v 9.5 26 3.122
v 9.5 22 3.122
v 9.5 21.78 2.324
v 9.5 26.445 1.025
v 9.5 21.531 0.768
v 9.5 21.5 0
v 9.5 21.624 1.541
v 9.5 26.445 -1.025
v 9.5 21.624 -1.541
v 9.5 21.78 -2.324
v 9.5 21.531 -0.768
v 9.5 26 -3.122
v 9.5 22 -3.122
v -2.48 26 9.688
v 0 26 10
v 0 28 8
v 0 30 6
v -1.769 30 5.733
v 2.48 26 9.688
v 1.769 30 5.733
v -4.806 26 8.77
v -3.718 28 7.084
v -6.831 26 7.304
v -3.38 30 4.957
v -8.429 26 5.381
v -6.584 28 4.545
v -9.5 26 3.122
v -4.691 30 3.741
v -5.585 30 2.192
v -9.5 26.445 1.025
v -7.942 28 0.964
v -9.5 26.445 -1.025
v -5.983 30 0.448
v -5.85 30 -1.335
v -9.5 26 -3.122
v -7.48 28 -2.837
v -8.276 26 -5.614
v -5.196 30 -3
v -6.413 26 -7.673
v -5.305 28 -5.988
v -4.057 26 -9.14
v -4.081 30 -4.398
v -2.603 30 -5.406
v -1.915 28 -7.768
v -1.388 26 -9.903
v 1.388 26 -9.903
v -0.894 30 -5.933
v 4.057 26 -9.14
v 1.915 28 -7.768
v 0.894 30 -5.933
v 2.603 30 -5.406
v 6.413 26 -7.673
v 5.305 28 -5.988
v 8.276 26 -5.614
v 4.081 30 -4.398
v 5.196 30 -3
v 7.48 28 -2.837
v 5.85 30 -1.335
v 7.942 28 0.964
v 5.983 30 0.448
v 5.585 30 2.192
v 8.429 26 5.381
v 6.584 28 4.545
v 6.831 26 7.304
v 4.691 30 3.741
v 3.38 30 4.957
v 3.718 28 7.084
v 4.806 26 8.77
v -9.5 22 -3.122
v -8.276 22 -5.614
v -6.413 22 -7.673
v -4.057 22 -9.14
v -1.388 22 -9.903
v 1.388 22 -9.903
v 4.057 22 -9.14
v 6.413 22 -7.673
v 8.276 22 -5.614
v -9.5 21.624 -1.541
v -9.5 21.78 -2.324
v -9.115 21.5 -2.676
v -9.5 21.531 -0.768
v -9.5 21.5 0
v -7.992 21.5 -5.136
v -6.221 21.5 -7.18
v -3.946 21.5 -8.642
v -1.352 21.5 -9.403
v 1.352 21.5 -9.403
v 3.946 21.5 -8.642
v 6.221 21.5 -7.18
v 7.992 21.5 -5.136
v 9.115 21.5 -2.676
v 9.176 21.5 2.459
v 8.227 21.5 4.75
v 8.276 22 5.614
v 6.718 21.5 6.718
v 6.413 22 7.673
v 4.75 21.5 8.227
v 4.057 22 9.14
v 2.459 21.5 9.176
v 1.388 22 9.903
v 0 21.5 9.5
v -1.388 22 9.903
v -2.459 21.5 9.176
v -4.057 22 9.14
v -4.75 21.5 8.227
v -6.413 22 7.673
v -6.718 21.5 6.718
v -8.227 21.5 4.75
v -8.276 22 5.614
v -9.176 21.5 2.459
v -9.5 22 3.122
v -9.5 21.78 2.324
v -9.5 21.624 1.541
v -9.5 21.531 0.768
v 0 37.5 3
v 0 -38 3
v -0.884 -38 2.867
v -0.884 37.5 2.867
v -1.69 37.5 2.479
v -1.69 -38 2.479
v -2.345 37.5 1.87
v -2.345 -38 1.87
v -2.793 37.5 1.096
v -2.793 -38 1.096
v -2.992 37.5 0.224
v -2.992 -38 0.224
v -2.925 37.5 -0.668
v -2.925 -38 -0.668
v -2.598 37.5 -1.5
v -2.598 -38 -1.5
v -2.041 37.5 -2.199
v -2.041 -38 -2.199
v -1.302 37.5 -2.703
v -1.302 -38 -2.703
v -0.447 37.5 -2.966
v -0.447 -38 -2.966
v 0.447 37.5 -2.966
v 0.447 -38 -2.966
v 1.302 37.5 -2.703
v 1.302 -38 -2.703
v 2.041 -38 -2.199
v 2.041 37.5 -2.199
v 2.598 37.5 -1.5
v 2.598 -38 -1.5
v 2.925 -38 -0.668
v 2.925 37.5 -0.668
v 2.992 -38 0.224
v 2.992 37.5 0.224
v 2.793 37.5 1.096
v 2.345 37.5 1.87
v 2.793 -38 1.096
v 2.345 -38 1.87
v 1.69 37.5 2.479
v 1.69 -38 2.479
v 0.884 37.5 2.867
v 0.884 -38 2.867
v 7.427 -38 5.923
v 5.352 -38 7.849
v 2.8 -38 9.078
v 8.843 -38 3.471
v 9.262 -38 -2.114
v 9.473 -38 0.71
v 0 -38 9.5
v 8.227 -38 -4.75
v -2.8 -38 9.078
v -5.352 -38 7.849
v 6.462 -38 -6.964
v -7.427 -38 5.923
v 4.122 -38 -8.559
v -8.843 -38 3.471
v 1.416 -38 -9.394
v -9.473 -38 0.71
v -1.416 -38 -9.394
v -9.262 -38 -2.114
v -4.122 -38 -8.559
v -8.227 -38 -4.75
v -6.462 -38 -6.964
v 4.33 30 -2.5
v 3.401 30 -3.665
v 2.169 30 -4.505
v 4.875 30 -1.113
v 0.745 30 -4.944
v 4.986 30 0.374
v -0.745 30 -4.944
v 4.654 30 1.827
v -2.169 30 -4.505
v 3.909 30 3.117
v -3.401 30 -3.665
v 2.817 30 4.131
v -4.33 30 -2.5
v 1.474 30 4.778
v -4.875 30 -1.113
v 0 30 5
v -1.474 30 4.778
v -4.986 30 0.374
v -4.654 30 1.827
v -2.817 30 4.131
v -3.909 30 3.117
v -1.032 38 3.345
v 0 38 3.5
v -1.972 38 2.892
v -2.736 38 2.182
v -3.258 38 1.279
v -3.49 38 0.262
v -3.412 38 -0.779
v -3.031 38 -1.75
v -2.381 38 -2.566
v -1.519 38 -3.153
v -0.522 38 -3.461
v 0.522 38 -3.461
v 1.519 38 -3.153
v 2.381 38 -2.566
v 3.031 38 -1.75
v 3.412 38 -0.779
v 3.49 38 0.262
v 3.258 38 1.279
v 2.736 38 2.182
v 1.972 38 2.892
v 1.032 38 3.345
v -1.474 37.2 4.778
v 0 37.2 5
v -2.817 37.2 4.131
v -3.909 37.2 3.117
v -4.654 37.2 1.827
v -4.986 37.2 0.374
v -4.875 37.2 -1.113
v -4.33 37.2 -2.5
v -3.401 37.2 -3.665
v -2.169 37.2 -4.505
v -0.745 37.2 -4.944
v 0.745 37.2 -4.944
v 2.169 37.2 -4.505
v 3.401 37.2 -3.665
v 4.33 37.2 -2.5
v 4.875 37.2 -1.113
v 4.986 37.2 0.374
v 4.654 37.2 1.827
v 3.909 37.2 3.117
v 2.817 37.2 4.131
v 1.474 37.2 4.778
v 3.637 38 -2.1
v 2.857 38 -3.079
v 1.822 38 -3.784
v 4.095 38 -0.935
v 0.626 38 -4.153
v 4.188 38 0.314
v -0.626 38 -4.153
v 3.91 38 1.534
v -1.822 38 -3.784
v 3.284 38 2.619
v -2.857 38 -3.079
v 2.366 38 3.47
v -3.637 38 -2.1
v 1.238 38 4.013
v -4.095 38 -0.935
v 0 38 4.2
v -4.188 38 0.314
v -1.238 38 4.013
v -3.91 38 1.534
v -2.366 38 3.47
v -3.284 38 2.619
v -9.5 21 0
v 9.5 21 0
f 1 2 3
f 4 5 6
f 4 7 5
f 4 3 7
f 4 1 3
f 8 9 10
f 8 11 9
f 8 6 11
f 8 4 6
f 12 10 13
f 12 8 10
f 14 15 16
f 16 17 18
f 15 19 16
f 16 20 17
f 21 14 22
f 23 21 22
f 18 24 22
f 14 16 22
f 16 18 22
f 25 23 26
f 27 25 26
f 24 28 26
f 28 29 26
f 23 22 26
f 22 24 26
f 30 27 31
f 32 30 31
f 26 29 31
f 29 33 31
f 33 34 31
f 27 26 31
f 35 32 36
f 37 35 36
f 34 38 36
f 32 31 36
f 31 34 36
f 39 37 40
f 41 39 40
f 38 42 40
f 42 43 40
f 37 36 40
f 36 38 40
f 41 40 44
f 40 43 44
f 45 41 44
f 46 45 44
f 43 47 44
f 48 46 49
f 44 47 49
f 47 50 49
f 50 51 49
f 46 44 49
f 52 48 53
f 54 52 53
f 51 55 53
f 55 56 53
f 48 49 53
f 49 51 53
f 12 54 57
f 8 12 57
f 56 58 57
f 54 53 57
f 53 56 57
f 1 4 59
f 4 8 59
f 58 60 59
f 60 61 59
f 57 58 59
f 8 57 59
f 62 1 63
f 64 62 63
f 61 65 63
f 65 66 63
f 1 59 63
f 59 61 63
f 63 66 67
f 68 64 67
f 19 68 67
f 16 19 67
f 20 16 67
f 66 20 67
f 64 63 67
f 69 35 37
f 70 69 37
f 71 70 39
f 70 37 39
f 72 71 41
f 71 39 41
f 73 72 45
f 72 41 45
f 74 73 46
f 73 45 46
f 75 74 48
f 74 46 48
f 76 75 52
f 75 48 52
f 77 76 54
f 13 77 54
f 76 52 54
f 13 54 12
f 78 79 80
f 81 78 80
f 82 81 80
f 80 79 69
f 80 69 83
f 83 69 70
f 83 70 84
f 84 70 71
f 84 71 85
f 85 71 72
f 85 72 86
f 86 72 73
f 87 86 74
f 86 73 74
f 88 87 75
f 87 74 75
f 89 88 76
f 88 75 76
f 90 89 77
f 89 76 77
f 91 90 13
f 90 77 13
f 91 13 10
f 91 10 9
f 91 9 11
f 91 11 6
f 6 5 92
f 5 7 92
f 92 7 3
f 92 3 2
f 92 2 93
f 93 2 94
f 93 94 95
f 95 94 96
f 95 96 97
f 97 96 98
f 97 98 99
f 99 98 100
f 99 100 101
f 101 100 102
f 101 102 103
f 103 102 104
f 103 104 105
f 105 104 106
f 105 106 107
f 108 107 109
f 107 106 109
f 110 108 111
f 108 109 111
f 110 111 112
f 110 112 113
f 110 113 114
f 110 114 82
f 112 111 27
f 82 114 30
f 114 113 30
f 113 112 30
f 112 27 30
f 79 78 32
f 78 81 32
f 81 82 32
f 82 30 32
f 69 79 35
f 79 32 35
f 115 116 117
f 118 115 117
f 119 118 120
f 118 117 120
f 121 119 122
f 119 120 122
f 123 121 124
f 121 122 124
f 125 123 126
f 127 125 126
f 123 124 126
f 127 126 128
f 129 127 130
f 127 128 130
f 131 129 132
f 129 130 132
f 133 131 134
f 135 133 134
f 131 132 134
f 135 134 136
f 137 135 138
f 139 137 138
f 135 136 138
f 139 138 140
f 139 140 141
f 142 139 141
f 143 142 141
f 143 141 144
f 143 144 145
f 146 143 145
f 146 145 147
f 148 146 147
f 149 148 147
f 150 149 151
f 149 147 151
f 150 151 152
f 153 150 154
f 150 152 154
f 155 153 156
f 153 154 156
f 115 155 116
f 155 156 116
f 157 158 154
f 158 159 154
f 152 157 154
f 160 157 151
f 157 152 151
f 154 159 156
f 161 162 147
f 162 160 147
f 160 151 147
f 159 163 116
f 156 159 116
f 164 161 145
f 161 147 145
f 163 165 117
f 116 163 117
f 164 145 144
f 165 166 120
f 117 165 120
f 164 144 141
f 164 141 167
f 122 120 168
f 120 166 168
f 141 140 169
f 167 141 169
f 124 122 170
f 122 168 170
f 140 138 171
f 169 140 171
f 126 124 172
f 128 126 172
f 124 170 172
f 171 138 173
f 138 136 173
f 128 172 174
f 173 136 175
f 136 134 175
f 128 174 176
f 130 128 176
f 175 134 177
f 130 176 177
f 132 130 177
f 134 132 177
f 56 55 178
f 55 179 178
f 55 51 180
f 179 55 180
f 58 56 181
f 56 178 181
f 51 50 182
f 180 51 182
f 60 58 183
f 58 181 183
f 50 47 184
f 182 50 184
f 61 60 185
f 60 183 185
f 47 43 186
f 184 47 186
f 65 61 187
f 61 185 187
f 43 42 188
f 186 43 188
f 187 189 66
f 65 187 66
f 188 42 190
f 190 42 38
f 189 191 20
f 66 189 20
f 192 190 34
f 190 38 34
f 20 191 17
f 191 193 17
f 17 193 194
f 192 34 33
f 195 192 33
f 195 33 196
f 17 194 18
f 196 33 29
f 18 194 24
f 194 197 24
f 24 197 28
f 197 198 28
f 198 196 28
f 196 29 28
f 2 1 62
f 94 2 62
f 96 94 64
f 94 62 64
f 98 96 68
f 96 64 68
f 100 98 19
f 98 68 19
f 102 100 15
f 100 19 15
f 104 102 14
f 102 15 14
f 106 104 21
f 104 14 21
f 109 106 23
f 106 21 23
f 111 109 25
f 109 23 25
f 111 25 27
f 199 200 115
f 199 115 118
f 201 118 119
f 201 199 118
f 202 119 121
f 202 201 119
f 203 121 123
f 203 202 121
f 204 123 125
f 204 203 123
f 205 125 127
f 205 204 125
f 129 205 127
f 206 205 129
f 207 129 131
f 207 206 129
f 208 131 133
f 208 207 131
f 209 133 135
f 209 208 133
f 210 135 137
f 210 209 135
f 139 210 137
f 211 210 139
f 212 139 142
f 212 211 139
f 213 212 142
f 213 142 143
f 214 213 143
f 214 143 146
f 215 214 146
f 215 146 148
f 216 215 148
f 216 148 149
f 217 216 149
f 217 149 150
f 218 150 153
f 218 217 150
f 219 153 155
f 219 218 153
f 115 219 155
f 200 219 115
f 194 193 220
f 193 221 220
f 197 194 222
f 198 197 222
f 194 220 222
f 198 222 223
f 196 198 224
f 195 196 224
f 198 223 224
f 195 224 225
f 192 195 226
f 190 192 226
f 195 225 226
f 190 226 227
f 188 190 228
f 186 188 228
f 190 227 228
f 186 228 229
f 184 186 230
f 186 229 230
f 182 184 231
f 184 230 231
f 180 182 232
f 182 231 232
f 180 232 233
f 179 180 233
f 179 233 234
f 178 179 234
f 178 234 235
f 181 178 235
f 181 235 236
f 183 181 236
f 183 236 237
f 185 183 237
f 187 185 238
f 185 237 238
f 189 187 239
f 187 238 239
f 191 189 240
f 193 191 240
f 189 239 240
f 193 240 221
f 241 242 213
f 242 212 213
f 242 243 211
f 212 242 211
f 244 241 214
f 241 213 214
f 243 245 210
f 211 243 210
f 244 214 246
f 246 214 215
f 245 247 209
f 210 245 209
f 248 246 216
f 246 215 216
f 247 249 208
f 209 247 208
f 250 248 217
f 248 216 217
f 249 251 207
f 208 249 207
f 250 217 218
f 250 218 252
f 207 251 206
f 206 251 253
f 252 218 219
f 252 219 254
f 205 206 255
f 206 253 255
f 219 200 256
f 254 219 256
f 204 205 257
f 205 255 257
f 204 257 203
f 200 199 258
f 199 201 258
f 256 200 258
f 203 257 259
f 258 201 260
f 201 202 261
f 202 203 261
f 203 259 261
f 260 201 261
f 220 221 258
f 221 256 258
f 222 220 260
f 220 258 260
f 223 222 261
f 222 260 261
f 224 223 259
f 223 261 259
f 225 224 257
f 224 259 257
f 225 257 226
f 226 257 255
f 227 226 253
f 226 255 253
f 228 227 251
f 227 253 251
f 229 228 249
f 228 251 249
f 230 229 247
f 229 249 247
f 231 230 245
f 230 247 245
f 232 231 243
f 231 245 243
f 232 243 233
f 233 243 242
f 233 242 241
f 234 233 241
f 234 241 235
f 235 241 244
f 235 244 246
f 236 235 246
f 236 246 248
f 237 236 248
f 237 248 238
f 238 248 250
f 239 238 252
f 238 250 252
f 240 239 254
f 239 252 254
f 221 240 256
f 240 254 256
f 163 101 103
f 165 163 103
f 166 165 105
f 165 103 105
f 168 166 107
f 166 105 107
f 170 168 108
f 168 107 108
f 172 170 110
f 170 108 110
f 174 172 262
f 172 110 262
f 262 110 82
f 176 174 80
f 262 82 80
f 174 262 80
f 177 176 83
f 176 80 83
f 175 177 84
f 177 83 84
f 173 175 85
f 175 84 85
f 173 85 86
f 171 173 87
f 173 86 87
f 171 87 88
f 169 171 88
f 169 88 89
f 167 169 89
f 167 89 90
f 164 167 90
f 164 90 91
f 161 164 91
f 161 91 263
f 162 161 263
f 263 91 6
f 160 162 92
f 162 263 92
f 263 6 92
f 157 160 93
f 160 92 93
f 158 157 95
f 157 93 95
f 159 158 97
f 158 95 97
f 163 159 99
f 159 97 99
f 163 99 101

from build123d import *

# Parameters (mm, degrees)
SKIZZE3_W                       = 5
SKIZZE3_H                       = 23
SCHNITT_LINEAR_AUSTRAGEN1_DEPTH = 9
FASE1_SIZE                      = 0.5


with BuildPart() as part:
    # Skizze2 → Rotation1 (revolve)
    with BuildSketch(Plane(origin=(0, 0, 0), x_dir=(0, 0, -1), z_dir=(1, 0, 0)), mode=Mode.PRIVATE) as rotation1_sk:
        Polygon((3, 38), (3, -38), (9.5, -38), (9.5, 21.5), (10, 22), (10, 26), (6, 30), (5, 30), (5, 37.2), (4.2, 38), align=None)
    revolve(rotation1_sk.sketch.rotate(Axis((0, 40.422682589, 0), (0, -1, 0)), 180), axis=Axis((0, 40.422682589, 0), (0, -1, 0)))

    # Skizze3 → Schnitt-Linear austragen1 (cut)
    with BuildSketch(Plane(origin=(0, 30, 0), x_dir=(1, 0, 0), z_dir=(0, 1, 0))):
        with Locations((12, 0)):
            Rectangle(SKIZZE3_W, SKIZZE3_H)
        with Locations((-12, 0)):
            Rectangle(SKIZZE3_W, SKIZZE3_H)
    extrude(amount=-SCHNITT_LINEAR_AUSTRAGEN1_DEPTH, mode=Mode.SUBTRACT)

    # Fase1
    fase1_edges = [part.edges().sort_by_distance(p)[0] for p in [
        (0, 38, -3),
    ]]
    chamfer(fase1_edges, length=FASE1_SIZE)


solid = part.part
